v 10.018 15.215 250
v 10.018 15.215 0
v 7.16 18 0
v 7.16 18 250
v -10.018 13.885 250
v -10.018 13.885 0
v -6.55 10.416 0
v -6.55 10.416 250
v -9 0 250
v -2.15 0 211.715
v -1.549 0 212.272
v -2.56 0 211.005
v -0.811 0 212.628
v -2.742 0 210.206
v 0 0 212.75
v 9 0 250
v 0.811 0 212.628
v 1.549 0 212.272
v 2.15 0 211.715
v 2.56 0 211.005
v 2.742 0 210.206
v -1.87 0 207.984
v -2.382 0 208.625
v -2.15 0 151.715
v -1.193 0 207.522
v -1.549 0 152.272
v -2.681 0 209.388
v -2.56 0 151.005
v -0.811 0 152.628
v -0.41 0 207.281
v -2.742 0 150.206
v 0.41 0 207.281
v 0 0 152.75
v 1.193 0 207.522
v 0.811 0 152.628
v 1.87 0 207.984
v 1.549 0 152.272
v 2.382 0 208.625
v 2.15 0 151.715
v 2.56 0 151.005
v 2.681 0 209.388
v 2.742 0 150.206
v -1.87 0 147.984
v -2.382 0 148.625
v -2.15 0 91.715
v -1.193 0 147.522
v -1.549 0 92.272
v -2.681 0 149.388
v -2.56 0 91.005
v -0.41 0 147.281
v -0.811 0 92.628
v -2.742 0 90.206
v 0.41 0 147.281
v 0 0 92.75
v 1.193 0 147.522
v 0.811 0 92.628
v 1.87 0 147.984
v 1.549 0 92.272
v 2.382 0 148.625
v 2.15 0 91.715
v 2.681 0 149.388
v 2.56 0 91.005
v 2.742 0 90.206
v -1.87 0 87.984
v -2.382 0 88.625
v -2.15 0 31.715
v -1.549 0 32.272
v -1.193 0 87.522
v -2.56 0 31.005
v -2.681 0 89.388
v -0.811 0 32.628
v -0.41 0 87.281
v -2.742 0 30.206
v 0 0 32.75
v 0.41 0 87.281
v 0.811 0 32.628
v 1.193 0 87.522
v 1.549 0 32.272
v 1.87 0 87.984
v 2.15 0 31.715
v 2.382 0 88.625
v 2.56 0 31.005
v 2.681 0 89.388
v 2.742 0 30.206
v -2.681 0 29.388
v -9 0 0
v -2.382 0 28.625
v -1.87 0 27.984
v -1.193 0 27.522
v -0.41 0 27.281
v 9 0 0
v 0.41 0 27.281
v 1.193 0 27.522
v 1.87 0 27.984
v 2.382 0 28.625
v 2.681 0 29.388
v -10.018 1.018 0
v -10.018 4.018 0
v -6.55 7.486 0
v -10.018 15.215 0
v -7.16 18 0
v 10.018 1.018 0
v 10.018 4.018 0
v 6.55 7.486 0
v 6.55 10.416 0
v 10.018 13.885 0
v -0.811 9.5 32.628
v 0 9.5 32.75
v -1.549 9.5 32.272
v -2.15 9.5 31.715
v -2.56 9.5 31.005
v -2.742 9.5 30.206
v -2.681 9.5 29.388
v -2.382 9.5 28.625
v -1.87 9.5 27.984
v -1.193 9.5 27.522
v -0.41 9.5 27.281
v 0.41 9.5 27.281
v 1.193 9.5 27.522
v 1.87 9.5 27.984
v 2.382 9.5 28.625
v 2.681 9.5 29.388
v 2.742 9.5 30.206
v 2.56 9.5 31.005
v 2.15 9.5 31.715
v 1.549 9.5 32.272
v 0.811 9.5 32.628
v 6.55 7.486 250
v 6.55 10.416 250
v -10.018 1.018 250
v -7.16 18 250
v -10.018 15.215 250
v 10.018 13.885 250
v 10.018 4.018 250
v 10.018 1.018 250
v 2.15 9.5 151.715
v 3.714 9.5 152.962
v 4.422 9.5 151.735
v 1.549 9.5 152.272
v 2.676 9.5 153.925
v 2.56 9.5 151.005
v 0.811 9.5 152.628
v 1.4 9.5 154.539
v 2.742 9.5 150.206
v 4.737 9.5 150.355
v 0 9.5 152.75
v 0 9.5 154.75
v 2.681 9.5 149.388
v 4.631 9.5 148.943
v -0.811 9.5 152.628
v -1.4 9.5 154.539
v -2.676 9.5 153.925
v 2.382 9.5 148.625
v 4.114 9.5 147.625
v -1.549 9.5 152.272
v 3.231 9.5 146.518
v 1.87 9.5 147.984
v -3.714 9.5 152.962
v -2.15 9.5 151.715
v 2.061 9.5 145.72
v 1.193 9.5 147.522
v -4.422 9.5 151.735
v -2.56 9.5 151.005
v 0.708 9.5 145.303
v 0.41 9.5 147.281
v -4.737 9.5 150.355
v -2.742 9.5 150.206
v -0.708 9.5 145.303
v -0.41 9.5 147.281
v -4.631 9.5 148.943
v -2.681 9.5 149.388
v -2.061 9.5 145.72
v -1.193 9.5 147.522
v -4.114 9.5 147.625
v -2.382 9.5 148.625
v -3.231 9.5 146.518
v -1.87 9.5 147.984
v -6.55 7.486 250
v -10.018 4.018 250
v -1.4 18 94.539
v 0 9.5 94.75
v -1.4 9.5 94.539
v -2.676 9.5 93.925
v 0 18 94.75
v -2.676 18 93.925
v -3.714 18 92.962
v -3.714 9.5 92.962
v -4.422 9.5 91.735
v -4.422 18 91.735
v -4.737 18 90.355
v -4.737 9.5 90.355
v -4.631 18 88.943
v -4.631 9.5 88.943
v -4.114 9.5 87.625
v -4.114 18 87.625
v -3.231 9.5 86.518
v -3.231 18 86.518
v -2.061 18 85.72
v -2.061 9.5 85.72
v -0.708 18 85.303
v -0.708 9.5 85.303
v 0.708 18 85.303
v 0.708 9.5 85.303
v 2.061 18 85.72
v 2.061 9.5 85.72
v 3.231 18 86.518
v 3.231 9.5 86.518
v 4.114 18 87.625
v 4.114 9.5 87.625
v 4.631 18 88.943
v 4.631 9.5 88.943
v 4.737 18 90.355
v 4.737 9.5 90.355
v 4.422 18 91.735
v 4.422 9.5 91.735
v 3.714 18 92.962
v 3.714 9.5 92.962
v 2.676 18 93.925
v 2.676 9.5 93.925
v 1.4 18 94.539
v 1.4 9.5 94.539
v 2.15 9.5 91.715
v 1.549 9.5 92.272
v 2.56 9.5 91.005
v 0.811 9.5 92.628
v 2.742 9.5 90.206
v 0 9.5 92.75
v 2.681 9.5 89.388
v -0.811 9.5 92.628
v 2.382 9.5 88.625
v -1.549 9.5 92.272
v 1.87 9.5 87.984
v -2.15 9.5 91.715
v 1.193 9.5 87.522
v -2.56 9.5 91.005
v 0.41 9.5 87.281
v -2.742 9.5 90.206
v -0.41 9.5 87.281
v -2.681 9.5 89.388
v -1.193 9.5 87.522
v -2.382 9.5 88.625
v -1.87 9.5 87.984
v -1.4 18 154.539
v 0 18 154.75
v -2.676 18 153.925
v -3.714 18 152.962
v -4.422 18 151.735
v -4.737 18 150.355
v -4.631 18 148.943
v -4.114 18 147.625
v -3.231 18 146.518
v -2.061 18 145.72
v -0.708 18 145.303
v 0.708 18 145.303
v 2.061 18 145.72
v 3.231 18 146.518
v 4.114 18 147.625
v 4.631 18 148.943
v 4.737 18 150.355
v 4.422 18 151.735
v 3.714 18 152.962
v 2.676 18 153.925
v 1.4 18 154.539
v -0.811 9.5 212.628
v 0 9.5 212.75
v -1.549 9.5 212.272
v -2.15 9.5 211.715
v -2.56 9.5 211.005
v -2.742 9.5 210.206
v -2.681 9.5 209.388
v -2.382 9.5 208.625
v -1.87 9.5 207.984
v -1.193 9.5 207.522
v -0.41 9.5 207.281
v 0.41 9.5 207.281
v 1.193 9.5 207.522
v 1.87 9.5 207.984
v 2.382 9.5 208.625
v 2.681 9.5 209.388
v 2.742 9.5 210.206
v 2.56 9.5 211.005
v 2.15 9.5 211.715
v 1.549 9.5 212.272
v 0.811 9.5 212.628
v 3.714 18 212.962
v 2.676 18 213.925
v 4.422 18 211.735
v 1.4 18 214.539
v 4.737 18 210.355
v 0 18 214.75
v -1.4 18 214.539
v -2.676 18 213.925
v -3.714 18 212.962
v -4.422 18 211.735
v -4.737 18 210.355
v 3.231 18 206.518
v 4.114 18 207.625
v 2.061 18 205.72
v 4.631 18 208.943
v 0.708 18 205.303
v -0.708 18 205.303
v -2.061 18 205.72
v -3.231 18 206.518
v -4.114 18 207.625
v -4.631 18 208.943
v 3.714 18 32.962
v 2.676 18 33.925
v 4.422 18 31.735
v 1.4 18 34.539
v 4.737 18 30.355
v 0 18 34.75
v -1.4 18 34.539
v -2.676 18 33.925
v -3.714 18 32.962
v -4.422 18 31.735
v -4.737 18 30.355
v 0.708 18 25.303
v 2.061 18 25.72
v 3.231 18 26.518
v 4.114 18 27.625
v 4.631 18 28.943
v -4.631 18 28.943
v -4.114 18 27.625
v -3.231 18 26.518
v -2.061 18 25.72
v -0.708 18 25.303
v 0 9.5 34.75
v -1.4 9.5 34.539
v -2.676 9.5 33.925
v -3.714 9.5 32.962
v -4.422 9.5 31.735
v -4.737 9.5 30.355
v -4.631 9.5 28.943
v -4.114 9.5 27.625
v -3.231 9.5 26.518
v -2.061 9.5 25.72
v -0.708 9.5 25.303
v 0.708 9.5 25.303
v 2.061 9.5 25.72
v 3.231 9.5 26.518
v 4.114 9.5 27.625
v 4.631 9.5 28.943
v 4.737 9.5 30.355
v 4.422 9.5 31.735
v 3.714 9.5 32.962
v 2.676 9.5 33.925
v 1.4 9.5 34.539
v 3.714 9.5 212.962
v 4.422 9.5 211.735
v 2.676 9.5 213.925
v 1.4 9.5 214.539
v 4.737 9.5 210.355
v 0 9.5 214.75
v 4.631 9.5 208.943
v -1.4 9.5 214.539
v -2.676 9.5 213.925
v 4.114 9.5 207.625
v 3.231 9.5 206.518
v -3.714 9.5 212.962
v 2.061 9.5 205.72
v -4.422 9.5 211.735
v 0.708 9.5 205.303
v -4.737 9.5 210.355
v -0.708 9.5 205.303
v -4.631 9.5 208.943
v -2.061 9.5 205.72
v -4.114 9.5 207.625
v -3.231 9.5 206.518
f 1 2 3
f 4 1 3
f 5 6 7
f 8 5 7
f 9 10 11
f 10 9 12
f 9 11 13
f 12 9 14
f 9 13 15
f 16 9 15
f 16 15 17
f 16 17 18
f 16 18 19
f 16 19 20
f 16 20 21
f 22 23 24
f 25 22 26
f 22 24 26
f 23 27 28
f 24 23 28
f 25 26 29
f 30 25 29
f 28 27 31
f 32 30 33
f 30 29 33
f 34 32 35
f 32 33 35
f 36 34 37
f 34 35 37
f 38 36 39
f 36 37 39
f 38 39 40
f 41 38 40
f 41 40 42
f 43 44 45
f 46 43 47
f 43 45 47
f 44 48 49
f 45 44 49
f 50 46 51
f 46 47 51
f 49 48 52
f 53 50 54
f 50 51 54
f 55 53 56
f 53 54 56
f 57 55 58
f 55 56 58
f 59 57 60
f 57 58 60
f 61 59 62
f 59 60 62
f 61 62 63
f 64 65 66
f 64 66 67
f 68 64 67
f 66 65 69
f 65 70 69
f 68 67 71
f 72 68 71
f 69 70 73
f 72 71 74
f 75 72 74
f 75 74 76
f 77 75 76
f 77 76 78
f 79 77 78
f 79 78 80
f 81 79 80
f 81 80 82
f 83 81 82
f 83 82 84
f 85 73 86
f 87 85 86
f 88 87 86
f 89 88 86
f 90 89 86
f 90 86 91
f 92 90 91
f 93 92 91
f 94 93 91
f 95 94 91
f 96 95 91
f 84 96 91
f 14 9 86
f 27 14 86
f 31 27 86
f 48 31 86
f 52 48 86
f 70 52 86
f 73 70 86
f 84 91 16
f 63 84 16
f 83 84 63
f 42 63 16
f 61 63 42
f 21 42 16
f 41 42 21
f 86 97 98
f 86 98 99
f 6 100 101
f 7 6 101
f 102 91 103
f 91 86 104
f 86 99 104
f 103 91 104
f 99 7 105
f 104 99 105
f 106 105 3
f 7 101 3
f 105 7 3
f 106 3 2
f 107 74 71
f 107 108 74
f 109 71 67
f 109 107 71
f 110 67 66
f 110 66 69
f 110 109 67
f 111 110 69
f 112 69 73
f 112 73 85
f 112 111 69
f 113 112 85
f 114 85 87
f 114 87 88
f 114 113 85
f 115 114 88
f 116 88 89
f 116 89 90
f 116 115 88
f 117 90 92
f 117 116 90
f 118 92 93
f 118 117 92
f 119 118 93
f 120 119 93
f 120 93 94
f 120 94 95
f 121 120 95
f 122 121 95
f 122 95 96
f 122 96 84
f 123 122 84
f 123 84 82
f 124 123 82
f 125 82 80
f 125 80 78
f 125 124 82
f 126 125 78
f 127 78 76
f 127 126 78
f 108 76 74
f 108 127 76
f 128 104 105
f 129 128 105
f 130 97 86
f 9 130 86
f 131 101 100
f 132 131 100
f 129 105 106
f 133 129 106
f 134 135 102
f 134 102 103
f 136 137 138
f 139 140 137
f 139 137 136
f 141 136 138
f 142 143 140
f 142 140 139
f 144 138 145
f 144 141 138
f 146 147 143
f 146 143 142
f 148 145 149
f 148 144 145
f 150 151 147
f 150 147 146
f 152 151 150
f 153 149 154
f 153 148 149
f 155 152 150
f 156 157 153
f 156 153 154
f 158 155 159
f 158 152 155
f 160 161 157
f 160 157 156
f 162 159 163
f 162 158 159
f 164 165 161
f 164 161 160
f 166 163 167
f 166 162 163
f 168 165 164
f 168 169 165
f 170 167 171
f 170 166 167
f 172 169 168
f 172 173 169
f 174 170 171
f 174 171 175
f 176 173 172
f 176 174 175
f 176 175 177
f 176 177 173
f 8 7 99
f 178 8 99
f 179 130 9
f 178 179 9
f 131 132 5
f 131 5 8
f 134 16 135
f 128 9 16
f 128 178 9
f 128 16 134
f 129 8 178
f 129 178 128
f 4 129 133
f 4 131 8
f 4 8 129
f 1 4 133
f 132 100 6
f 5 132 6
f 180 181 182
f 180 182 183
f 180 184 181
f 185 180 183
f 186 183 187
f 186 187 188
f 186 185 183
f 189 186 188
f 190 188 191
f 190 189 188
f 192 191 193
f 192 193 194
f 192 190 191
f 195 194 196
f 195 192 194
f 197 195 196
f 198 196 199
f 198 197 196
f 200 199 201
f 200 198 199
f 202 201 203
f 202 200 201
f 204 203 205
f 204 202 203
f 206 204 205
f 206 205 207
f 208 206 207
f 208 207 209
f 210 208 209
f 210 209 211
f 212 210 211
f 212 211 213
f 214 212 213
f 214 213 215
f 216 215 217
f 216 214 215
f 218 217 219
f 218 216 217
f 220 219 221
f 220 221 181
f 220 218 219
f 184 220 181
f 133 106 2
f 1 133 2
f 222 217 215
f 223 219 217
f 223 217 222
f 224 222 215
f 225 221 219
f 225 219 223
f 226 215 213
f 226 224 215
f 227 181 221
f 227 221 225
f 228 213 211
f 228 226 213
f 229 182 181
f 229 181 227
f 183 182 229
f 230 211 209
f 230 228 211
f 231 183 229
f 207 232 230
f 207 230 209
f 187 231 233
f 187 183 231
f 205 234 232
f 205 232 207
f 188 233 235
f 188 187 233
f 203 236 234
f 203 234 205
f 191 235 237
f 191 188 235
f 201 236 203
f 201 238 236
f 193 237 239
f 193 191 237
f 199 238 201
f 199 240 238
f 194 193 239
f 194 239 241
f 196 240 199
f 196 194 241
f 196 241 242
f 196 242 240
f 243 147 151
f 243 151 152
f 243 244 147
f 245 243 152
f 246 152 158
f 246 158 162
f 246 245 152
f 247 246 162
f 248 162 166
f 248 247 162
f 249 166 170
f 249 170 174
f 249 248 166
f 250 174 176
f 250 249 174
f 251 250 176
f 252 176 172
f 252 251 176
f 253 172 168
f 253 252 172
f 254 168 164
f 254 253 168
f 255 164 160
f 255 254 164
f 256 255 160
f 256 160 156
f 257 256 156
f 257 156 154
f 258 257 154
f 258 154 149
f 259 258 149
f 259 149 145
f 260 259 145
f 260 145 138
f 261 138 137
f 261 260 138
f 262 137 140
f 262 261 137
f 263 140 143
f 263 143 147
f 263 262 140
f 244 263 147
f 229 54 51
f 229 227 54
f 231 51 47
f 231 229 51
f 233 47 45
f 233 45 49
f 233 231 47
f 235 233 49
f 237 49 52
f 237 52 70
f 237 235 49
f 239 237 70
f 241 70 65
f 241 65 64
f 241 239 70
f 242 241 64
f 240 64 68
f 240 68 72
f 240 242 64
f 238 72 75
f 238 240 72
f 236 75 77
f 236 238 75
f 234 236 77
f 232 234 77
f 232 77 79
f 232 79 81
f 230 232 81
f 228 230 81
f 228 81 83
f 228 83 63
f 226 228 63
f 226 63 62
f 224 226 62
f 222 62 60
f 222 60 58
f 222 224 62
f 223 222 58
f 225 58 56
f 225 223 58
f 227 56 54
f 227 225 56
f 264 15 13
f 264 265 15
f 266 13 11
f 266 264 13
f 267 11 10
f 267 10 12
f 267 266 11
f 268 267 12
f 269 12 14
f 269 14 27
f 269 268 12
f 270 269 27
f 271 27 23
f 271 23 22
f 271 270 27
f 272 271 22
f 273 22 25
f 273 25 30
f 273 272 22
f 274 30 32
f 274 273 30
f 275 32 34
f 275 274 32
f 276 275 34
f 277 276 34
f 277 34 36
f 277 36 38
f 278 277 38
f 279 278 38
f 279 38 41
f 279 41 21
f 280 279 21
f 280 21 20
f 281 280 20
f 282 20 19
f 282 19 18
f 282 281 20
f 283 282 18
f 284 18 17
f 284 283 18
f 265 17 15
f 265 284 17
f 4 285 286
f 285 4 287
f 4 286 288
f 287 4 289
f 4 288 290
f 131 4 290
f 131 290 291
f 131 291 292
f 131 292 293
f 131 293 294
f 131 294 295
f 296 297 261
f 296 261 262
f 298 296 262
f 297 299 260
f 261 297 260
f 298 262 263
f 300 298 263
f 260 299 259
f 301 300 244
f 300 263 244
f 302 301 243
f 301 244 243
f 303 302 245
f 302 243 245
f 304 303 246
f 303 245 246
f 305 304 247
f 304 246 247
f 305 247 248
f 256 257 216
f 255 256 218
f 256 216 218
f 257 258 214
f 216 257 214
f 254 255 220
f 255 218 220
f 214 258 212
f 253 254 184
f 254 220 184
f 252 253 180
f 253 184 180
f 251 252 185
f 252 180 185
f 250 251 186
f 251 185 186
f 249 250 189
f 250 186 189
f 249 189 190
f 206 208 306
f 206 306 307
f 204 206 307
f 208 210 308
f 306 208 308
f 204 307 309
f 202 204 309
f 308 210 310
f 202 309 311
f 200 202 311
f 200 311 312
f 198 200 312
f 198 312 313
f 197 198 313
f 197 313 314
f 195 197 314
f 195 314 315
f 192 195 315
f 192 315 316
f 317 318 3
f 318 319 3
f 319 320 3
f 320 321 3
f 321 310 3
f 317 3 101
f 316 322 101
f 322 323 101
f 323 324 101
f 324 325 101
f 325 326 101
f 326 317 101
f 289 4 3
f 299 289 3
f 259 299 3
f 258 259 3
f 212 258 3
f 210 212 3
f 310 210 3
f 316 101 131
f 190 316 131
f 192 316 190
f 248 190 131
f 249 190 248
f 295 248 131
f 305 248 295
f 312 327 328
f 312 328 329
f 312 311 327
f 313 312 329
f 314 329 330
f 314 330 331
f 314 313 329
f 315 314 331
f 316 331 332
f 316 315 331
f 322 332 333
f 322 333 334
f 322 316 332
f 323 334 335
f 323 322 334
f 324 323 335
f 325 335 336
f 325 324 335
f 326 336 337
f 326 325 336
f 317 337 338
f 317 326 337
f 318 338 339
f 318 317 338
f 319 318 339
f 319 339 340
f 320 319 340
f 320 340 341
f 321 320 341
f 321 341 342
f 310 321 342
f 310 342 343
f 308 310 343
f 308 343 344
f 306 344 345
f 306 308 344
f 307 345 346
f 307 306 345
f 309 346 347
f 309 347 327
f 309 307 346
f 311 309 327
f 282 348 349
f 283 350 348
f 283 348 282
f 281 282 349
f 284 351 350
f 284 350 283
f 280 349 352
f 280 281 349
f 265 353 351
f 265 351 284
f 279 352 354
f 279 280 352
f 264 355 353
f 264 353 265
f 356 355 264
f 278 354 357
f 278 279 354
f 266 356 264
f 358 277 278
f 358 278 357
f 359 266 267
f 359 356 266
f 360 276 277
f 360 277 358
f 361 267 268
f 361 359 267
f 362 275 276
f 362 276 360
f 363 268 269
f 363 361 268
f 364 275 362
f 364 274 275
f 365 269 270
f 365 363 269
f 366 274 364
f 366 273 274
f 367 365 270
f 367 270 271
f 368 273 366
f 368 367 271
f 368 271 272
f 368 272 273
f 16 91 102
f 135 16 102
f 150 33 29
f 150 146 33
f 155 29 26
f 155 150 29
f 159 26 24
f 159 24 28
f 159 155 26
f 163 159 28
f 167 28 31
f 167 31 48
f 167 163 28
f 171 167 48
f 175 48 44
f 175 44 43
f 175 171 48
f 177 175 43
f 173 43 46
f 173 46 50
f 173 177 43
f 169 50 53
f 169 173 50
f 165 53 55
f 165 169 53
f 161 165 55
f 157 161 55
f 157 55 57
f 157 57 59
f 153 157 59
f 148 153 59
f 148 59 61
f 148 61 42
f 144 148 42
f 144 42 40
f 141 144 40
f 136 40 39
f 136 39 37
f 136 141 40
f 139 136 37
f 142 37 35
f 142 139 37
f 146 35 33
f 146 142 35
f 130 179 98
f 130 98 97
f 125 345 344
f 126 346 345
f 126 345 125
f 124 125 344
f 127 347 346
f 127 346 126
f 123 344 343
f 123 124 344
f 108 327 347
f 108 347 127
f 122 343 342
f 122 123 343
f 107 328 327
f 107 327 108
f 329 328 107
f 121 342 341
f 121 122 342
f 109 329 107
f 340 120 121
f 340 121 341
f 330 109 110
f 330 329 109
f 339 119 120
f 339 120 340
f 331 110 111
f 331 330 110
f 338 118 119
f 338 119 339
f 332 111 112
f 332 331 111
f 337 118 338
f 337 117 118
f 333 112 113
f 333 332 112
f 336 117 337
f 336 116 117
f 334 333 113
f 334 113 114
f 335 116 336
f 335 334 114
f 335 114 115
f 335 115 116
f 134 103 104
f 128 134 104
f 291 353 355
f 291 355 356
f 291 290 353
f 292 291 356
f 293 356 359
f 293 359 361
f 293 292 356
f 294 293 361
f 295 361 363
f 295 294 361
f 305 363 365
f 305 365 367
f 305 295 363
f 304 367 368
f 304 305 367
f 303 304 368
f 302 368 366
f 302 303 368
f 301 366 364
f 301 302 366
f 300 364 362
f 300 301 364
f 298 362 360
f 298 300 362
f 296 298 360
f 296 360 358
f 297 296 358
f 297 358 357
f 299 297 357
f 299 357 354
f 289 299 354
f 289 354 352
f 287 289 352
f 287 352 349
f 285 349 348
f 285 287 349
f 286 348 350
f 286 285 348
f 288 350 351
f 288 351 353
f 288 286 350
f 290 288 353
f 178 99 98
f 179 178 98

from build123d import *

# Parameters (mm, degrees)
BOSS_EXTRUDE1_DEPTH = 250
LPATTERN2_COUNT     = 4
LPATTERN2_PITCH     = 60


with BuildPart() as part:
    # Sketch1 → Boss-Extrude1 (new body)
    with BuildSketch(Plane.XY):
        Polygon((0, 18), (0, 0), (9, 0), (10.018233765, 1.018233765), (10.018233765, 4.018233765), (6.55, 7.48646753), (6.55, 10.41646753), (10.018233765, 13.884701295), (10.018233765, 15.214701295), (7.16, 18), align=None)
        Polygon((-9, 0), (0, 0), (0, 18), (-7.16, 18), (-10.018233765, 15.214701295), (-10.018233765, 13.884701295), (-6.55, 10.41646753), (-6.55, 7.48646753), (-10.018233765, 4.018233765), (-10.018233765, 1.018233765), align=None)
    extrude(amount=BOSS_EXTRUDE1_DEPTH)

    # Sketch4 → Hole1 (revolve, cut)
    with BuildSketch(Plane(origin=(0, 18, 30), x_dir=(0, 0, 1), z_dir=(1, 0, 0))):
        Polygon((0, 0), (0, 19.652366702), (2.75, 18), (2.75, 8.5), (4.75, 8.5), (4.75, 0), align=None)
    hole1 = revolve(axis=Axis((0, 29.310875039, 30), (0, -1, 0)), mode=Mode.SUBTRACT)

    # LPattern2: Hole1 ×4
    with Locations(*[(0, 0, i * LPATTERN2_PITCH) for i in range(1, LPATTERN2_COUNT)]):
        add(hole1, mode=Mode.SUBTRACT)


solid = part.part
